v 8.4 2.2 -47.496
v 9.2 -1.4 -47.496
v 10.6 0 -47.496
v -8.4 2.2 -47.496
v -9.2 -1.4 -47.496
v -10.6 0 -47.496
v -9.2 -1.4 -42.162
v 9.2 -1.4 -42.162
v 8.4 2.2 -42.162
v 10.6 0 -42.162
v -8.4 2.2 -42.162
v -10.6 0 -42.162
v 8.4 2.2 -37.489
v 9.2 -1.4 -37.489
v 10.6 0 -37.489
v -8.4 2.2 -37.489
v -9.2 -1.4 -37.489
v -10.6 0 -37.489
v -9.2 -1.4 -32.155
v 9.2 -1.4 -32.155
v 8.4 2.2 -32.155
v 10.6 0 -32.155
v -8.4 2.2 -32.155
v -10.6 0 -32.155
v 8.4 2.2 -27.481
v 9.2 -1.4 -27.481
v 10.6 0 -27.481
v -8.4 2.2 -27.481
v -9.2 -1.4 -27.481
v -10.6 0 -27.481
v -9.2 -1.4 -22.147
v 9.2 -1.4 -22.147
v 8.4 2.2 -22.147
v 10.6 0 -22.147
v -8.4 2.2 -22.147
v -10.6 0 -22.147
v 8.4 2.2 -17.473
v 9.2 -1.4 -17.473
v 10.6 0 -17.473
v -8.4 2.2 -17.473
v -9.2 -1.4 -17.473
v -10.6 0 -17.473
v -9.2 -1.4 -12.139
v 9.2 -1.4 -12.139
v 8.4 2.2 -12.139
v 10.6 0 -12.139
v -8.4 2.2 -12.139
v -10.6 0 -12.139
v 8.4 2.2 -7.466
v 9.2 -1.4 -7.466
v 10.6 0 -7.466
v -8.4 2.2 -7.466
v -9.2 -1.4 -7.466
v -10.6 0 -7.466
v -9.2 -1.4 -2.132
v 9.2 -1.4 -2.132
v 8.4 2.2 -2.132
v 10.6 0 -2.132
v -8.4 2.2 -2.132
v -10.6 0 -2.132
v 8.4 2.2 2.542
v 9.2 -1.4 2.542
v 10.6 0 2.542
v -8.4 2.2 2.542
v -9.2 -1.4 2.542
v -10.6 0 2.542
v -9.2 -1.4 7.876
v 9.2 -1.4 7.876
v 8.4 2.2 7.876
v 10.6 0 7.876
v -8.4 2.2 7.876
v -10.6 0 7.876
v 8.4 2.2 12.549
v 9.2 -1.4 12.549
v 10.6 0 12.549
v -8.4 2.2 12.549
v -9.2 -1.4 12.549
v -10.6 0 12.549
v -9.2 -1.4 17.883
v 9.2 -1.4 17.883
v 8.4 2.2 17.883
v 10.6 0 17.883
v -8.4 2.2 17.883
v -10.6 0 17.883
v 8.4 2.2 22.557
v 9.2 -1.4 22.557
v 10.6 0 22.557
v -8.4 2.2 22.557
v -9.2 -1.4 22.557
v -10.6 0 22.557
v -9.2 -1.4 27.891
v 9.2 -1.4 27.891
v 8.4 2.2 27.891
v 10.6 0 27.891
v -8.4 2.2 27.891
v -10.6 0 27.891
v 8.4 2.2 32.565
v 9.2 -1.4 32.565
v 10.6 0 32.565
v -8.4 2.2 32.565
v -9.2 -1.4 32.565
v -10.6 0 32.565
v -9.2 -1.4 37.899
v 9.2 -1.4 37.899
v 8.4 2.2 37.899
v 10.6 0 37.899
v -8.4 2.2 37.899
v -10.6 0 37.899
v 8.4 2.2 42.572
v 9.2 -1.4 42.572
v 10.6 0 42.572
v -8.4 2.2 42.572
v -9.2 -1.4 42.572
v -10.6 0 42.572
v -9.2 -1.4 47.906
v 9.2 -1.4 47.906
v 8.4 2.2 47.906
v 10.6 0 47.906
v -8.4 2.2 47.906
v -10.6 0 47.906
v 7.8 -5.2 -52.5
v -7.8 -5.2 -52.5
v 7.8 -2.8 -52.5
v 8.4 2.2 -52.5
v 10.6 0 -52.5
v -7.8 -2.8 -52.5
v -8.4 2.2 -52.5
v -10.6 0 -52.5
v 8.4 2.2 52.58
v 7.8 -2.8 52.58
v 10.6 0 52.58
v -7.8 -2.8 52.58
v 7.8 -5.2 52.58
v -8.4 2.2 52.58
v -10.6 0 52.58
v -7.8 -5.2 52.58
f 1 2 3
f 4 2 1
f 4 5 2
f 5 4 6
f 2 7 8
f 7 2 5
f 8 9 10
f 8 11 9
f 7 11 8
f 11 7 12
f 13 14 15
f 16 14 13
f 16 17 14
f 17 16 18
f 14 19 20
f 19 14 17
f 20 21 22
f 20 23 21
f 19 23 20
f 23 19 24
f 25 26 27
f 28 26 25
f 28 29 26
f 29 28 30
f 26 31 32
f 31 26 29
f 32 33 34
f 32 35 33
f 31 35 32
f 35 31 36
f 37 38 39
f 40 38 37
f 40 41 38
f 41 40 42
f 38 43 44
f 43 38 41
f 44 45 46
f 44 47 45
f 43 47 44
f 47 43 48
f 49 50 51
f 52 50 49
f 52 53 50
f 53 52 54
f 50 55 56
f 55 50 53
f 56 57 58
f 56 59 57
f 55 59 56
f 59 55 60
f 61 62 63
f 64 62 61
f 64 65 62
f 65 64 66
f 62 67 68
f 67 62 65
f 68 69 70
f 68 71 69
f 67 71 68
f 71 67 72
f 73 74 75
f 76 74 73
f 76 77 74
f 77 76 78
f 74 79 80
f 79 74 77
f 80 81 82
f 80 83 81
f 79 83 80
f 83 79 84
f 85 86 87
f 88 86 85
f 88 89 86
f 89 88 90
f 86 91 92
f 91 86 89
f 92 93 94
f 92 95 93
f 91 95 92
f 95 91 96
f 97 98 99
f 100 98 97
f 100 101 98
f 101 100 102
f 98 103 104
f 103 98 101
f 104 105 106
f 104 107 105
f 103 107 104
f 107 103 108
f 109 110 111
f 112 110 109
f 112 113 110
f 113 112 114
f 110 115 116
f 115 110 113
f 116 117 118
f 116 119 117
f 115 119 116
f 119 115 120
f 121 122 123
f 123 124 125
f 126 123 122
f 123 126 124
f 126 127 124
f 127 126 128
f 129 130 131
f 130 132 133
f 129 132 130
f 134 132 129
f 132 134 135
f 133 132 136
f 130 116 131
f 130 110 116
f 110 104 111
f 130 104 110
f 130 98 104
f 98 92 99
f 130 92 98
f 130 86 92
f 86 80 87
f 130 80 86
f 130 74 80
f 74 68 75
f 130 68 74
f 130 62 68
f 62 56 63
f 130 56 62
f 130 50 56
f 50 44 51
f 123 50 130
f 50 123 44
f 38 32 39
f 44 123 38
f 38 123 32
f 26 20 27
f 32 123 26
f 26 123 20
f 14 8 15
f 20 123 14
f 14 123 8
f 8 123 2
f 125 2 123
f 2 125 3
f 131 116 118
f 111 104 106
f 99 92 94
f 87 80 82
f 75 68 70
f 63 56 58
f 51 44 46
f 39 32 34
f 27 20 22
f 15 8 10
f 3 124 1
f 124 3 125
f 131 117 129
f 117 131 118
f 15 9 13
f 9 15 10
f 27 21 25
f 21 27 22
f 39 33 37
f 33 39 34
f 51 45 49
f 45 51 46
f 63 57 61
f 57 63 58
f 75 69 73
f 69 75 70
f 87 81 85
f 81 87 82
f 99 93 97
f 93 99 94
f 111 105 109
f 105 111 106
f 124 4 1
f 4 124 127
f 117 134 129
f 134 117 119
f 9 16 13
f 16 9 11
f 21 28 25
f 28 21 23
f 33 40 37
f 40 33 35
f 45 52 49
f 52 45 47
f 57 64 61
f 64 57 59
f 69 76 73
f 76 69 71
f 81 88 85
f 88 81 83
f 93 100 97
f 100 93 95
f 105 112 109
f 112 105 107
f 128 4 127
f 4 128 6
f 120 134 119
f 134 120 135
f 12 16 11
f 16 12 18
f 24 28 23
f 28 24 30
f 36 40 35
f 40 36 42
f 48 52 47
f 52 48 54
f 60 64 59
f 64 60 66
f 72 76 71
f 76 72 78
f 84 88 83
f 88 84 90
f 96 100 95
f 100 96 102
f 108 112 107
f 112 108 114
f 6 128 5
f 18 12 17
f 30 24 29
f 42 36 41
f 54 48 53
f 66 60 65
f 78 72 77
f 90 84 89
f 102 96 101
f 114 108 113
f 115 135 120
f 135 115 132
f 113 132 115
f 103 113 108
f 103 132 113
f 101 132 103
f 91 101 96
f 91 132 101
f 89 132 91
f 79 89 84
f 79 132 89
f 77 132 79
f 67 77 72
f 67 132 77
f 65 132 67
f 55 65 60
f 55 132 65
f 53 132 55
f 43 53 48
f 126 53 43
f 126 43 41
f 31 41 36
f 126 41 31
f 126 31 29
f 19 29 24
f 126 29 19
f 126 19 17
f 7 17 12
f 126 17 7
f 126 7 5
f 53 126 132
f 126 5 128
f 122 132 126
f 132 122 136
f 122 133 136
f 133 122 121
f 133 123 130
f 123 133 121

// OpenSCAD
/*
 This was originally:

 Picatinny rail for G36 airsoft gun
 By Stuart Livings, Matthew Roberts. (C) 2010

 This work is free software; you can redistribute it and/or modify it under
 the terms of the GNU General Public License as published by the Free Software
 Foundation; version 2.

 This work is distributed in the hope that it will be useful, but WITHOUT ANY
 WARRANTY; without even the implied warranty of MERCHANTABILITY or FITNESS FOR
 A PARTICULAR PURPOSE. See the version 2 of the GNU General Public License for
 more details.


Only the spacing has been tweaked. The center-to-center distance between gaps
in the rail should be 0.394 inches, or 10.0076 mm. The gap itself should be
0.206 inches; with a tolerance of -0.000" +0.008". To ensure any ridges from
printing don't try and make that go negative, I've set the gap to be 0.210 inches.
 */

rail(10);

module rail(sections) {
	translate(v = [0, 0, -5 * sections - 2.5])
        difference() {
		linear_extrude(height = (10.0076 * (0.5 + sections)))
               railprofile();
            translate([0,-0.6,0])
		union() {
			for (s = [1:sections]) {
				translate(v = [0, 0, s * 10.0076 - 10.0076/2.0])
                           #linear_extrude(height = 5.334)
                             cutprofile();
			}
		}
	  }
}

module railprofile() {
extra_height = 1.4;
	polygon(points=[[-10.6,0],[-8.4,2.2],[8.4,2.2],[10.6,0],[7.8,-2.8],[7.8,-3.8-extra_height],[-7.8,-3.8-extra_height],[-7.8,-2.8]], paths=[[0,1,2,3,4,5,6,7,0]]);
}

module cutprofile() {
	polygon(points=[[-12, -0.8], [-12, 3], [12, 3], [12, -0.8]], paths=[[0,1,2,3,0]]);
}
